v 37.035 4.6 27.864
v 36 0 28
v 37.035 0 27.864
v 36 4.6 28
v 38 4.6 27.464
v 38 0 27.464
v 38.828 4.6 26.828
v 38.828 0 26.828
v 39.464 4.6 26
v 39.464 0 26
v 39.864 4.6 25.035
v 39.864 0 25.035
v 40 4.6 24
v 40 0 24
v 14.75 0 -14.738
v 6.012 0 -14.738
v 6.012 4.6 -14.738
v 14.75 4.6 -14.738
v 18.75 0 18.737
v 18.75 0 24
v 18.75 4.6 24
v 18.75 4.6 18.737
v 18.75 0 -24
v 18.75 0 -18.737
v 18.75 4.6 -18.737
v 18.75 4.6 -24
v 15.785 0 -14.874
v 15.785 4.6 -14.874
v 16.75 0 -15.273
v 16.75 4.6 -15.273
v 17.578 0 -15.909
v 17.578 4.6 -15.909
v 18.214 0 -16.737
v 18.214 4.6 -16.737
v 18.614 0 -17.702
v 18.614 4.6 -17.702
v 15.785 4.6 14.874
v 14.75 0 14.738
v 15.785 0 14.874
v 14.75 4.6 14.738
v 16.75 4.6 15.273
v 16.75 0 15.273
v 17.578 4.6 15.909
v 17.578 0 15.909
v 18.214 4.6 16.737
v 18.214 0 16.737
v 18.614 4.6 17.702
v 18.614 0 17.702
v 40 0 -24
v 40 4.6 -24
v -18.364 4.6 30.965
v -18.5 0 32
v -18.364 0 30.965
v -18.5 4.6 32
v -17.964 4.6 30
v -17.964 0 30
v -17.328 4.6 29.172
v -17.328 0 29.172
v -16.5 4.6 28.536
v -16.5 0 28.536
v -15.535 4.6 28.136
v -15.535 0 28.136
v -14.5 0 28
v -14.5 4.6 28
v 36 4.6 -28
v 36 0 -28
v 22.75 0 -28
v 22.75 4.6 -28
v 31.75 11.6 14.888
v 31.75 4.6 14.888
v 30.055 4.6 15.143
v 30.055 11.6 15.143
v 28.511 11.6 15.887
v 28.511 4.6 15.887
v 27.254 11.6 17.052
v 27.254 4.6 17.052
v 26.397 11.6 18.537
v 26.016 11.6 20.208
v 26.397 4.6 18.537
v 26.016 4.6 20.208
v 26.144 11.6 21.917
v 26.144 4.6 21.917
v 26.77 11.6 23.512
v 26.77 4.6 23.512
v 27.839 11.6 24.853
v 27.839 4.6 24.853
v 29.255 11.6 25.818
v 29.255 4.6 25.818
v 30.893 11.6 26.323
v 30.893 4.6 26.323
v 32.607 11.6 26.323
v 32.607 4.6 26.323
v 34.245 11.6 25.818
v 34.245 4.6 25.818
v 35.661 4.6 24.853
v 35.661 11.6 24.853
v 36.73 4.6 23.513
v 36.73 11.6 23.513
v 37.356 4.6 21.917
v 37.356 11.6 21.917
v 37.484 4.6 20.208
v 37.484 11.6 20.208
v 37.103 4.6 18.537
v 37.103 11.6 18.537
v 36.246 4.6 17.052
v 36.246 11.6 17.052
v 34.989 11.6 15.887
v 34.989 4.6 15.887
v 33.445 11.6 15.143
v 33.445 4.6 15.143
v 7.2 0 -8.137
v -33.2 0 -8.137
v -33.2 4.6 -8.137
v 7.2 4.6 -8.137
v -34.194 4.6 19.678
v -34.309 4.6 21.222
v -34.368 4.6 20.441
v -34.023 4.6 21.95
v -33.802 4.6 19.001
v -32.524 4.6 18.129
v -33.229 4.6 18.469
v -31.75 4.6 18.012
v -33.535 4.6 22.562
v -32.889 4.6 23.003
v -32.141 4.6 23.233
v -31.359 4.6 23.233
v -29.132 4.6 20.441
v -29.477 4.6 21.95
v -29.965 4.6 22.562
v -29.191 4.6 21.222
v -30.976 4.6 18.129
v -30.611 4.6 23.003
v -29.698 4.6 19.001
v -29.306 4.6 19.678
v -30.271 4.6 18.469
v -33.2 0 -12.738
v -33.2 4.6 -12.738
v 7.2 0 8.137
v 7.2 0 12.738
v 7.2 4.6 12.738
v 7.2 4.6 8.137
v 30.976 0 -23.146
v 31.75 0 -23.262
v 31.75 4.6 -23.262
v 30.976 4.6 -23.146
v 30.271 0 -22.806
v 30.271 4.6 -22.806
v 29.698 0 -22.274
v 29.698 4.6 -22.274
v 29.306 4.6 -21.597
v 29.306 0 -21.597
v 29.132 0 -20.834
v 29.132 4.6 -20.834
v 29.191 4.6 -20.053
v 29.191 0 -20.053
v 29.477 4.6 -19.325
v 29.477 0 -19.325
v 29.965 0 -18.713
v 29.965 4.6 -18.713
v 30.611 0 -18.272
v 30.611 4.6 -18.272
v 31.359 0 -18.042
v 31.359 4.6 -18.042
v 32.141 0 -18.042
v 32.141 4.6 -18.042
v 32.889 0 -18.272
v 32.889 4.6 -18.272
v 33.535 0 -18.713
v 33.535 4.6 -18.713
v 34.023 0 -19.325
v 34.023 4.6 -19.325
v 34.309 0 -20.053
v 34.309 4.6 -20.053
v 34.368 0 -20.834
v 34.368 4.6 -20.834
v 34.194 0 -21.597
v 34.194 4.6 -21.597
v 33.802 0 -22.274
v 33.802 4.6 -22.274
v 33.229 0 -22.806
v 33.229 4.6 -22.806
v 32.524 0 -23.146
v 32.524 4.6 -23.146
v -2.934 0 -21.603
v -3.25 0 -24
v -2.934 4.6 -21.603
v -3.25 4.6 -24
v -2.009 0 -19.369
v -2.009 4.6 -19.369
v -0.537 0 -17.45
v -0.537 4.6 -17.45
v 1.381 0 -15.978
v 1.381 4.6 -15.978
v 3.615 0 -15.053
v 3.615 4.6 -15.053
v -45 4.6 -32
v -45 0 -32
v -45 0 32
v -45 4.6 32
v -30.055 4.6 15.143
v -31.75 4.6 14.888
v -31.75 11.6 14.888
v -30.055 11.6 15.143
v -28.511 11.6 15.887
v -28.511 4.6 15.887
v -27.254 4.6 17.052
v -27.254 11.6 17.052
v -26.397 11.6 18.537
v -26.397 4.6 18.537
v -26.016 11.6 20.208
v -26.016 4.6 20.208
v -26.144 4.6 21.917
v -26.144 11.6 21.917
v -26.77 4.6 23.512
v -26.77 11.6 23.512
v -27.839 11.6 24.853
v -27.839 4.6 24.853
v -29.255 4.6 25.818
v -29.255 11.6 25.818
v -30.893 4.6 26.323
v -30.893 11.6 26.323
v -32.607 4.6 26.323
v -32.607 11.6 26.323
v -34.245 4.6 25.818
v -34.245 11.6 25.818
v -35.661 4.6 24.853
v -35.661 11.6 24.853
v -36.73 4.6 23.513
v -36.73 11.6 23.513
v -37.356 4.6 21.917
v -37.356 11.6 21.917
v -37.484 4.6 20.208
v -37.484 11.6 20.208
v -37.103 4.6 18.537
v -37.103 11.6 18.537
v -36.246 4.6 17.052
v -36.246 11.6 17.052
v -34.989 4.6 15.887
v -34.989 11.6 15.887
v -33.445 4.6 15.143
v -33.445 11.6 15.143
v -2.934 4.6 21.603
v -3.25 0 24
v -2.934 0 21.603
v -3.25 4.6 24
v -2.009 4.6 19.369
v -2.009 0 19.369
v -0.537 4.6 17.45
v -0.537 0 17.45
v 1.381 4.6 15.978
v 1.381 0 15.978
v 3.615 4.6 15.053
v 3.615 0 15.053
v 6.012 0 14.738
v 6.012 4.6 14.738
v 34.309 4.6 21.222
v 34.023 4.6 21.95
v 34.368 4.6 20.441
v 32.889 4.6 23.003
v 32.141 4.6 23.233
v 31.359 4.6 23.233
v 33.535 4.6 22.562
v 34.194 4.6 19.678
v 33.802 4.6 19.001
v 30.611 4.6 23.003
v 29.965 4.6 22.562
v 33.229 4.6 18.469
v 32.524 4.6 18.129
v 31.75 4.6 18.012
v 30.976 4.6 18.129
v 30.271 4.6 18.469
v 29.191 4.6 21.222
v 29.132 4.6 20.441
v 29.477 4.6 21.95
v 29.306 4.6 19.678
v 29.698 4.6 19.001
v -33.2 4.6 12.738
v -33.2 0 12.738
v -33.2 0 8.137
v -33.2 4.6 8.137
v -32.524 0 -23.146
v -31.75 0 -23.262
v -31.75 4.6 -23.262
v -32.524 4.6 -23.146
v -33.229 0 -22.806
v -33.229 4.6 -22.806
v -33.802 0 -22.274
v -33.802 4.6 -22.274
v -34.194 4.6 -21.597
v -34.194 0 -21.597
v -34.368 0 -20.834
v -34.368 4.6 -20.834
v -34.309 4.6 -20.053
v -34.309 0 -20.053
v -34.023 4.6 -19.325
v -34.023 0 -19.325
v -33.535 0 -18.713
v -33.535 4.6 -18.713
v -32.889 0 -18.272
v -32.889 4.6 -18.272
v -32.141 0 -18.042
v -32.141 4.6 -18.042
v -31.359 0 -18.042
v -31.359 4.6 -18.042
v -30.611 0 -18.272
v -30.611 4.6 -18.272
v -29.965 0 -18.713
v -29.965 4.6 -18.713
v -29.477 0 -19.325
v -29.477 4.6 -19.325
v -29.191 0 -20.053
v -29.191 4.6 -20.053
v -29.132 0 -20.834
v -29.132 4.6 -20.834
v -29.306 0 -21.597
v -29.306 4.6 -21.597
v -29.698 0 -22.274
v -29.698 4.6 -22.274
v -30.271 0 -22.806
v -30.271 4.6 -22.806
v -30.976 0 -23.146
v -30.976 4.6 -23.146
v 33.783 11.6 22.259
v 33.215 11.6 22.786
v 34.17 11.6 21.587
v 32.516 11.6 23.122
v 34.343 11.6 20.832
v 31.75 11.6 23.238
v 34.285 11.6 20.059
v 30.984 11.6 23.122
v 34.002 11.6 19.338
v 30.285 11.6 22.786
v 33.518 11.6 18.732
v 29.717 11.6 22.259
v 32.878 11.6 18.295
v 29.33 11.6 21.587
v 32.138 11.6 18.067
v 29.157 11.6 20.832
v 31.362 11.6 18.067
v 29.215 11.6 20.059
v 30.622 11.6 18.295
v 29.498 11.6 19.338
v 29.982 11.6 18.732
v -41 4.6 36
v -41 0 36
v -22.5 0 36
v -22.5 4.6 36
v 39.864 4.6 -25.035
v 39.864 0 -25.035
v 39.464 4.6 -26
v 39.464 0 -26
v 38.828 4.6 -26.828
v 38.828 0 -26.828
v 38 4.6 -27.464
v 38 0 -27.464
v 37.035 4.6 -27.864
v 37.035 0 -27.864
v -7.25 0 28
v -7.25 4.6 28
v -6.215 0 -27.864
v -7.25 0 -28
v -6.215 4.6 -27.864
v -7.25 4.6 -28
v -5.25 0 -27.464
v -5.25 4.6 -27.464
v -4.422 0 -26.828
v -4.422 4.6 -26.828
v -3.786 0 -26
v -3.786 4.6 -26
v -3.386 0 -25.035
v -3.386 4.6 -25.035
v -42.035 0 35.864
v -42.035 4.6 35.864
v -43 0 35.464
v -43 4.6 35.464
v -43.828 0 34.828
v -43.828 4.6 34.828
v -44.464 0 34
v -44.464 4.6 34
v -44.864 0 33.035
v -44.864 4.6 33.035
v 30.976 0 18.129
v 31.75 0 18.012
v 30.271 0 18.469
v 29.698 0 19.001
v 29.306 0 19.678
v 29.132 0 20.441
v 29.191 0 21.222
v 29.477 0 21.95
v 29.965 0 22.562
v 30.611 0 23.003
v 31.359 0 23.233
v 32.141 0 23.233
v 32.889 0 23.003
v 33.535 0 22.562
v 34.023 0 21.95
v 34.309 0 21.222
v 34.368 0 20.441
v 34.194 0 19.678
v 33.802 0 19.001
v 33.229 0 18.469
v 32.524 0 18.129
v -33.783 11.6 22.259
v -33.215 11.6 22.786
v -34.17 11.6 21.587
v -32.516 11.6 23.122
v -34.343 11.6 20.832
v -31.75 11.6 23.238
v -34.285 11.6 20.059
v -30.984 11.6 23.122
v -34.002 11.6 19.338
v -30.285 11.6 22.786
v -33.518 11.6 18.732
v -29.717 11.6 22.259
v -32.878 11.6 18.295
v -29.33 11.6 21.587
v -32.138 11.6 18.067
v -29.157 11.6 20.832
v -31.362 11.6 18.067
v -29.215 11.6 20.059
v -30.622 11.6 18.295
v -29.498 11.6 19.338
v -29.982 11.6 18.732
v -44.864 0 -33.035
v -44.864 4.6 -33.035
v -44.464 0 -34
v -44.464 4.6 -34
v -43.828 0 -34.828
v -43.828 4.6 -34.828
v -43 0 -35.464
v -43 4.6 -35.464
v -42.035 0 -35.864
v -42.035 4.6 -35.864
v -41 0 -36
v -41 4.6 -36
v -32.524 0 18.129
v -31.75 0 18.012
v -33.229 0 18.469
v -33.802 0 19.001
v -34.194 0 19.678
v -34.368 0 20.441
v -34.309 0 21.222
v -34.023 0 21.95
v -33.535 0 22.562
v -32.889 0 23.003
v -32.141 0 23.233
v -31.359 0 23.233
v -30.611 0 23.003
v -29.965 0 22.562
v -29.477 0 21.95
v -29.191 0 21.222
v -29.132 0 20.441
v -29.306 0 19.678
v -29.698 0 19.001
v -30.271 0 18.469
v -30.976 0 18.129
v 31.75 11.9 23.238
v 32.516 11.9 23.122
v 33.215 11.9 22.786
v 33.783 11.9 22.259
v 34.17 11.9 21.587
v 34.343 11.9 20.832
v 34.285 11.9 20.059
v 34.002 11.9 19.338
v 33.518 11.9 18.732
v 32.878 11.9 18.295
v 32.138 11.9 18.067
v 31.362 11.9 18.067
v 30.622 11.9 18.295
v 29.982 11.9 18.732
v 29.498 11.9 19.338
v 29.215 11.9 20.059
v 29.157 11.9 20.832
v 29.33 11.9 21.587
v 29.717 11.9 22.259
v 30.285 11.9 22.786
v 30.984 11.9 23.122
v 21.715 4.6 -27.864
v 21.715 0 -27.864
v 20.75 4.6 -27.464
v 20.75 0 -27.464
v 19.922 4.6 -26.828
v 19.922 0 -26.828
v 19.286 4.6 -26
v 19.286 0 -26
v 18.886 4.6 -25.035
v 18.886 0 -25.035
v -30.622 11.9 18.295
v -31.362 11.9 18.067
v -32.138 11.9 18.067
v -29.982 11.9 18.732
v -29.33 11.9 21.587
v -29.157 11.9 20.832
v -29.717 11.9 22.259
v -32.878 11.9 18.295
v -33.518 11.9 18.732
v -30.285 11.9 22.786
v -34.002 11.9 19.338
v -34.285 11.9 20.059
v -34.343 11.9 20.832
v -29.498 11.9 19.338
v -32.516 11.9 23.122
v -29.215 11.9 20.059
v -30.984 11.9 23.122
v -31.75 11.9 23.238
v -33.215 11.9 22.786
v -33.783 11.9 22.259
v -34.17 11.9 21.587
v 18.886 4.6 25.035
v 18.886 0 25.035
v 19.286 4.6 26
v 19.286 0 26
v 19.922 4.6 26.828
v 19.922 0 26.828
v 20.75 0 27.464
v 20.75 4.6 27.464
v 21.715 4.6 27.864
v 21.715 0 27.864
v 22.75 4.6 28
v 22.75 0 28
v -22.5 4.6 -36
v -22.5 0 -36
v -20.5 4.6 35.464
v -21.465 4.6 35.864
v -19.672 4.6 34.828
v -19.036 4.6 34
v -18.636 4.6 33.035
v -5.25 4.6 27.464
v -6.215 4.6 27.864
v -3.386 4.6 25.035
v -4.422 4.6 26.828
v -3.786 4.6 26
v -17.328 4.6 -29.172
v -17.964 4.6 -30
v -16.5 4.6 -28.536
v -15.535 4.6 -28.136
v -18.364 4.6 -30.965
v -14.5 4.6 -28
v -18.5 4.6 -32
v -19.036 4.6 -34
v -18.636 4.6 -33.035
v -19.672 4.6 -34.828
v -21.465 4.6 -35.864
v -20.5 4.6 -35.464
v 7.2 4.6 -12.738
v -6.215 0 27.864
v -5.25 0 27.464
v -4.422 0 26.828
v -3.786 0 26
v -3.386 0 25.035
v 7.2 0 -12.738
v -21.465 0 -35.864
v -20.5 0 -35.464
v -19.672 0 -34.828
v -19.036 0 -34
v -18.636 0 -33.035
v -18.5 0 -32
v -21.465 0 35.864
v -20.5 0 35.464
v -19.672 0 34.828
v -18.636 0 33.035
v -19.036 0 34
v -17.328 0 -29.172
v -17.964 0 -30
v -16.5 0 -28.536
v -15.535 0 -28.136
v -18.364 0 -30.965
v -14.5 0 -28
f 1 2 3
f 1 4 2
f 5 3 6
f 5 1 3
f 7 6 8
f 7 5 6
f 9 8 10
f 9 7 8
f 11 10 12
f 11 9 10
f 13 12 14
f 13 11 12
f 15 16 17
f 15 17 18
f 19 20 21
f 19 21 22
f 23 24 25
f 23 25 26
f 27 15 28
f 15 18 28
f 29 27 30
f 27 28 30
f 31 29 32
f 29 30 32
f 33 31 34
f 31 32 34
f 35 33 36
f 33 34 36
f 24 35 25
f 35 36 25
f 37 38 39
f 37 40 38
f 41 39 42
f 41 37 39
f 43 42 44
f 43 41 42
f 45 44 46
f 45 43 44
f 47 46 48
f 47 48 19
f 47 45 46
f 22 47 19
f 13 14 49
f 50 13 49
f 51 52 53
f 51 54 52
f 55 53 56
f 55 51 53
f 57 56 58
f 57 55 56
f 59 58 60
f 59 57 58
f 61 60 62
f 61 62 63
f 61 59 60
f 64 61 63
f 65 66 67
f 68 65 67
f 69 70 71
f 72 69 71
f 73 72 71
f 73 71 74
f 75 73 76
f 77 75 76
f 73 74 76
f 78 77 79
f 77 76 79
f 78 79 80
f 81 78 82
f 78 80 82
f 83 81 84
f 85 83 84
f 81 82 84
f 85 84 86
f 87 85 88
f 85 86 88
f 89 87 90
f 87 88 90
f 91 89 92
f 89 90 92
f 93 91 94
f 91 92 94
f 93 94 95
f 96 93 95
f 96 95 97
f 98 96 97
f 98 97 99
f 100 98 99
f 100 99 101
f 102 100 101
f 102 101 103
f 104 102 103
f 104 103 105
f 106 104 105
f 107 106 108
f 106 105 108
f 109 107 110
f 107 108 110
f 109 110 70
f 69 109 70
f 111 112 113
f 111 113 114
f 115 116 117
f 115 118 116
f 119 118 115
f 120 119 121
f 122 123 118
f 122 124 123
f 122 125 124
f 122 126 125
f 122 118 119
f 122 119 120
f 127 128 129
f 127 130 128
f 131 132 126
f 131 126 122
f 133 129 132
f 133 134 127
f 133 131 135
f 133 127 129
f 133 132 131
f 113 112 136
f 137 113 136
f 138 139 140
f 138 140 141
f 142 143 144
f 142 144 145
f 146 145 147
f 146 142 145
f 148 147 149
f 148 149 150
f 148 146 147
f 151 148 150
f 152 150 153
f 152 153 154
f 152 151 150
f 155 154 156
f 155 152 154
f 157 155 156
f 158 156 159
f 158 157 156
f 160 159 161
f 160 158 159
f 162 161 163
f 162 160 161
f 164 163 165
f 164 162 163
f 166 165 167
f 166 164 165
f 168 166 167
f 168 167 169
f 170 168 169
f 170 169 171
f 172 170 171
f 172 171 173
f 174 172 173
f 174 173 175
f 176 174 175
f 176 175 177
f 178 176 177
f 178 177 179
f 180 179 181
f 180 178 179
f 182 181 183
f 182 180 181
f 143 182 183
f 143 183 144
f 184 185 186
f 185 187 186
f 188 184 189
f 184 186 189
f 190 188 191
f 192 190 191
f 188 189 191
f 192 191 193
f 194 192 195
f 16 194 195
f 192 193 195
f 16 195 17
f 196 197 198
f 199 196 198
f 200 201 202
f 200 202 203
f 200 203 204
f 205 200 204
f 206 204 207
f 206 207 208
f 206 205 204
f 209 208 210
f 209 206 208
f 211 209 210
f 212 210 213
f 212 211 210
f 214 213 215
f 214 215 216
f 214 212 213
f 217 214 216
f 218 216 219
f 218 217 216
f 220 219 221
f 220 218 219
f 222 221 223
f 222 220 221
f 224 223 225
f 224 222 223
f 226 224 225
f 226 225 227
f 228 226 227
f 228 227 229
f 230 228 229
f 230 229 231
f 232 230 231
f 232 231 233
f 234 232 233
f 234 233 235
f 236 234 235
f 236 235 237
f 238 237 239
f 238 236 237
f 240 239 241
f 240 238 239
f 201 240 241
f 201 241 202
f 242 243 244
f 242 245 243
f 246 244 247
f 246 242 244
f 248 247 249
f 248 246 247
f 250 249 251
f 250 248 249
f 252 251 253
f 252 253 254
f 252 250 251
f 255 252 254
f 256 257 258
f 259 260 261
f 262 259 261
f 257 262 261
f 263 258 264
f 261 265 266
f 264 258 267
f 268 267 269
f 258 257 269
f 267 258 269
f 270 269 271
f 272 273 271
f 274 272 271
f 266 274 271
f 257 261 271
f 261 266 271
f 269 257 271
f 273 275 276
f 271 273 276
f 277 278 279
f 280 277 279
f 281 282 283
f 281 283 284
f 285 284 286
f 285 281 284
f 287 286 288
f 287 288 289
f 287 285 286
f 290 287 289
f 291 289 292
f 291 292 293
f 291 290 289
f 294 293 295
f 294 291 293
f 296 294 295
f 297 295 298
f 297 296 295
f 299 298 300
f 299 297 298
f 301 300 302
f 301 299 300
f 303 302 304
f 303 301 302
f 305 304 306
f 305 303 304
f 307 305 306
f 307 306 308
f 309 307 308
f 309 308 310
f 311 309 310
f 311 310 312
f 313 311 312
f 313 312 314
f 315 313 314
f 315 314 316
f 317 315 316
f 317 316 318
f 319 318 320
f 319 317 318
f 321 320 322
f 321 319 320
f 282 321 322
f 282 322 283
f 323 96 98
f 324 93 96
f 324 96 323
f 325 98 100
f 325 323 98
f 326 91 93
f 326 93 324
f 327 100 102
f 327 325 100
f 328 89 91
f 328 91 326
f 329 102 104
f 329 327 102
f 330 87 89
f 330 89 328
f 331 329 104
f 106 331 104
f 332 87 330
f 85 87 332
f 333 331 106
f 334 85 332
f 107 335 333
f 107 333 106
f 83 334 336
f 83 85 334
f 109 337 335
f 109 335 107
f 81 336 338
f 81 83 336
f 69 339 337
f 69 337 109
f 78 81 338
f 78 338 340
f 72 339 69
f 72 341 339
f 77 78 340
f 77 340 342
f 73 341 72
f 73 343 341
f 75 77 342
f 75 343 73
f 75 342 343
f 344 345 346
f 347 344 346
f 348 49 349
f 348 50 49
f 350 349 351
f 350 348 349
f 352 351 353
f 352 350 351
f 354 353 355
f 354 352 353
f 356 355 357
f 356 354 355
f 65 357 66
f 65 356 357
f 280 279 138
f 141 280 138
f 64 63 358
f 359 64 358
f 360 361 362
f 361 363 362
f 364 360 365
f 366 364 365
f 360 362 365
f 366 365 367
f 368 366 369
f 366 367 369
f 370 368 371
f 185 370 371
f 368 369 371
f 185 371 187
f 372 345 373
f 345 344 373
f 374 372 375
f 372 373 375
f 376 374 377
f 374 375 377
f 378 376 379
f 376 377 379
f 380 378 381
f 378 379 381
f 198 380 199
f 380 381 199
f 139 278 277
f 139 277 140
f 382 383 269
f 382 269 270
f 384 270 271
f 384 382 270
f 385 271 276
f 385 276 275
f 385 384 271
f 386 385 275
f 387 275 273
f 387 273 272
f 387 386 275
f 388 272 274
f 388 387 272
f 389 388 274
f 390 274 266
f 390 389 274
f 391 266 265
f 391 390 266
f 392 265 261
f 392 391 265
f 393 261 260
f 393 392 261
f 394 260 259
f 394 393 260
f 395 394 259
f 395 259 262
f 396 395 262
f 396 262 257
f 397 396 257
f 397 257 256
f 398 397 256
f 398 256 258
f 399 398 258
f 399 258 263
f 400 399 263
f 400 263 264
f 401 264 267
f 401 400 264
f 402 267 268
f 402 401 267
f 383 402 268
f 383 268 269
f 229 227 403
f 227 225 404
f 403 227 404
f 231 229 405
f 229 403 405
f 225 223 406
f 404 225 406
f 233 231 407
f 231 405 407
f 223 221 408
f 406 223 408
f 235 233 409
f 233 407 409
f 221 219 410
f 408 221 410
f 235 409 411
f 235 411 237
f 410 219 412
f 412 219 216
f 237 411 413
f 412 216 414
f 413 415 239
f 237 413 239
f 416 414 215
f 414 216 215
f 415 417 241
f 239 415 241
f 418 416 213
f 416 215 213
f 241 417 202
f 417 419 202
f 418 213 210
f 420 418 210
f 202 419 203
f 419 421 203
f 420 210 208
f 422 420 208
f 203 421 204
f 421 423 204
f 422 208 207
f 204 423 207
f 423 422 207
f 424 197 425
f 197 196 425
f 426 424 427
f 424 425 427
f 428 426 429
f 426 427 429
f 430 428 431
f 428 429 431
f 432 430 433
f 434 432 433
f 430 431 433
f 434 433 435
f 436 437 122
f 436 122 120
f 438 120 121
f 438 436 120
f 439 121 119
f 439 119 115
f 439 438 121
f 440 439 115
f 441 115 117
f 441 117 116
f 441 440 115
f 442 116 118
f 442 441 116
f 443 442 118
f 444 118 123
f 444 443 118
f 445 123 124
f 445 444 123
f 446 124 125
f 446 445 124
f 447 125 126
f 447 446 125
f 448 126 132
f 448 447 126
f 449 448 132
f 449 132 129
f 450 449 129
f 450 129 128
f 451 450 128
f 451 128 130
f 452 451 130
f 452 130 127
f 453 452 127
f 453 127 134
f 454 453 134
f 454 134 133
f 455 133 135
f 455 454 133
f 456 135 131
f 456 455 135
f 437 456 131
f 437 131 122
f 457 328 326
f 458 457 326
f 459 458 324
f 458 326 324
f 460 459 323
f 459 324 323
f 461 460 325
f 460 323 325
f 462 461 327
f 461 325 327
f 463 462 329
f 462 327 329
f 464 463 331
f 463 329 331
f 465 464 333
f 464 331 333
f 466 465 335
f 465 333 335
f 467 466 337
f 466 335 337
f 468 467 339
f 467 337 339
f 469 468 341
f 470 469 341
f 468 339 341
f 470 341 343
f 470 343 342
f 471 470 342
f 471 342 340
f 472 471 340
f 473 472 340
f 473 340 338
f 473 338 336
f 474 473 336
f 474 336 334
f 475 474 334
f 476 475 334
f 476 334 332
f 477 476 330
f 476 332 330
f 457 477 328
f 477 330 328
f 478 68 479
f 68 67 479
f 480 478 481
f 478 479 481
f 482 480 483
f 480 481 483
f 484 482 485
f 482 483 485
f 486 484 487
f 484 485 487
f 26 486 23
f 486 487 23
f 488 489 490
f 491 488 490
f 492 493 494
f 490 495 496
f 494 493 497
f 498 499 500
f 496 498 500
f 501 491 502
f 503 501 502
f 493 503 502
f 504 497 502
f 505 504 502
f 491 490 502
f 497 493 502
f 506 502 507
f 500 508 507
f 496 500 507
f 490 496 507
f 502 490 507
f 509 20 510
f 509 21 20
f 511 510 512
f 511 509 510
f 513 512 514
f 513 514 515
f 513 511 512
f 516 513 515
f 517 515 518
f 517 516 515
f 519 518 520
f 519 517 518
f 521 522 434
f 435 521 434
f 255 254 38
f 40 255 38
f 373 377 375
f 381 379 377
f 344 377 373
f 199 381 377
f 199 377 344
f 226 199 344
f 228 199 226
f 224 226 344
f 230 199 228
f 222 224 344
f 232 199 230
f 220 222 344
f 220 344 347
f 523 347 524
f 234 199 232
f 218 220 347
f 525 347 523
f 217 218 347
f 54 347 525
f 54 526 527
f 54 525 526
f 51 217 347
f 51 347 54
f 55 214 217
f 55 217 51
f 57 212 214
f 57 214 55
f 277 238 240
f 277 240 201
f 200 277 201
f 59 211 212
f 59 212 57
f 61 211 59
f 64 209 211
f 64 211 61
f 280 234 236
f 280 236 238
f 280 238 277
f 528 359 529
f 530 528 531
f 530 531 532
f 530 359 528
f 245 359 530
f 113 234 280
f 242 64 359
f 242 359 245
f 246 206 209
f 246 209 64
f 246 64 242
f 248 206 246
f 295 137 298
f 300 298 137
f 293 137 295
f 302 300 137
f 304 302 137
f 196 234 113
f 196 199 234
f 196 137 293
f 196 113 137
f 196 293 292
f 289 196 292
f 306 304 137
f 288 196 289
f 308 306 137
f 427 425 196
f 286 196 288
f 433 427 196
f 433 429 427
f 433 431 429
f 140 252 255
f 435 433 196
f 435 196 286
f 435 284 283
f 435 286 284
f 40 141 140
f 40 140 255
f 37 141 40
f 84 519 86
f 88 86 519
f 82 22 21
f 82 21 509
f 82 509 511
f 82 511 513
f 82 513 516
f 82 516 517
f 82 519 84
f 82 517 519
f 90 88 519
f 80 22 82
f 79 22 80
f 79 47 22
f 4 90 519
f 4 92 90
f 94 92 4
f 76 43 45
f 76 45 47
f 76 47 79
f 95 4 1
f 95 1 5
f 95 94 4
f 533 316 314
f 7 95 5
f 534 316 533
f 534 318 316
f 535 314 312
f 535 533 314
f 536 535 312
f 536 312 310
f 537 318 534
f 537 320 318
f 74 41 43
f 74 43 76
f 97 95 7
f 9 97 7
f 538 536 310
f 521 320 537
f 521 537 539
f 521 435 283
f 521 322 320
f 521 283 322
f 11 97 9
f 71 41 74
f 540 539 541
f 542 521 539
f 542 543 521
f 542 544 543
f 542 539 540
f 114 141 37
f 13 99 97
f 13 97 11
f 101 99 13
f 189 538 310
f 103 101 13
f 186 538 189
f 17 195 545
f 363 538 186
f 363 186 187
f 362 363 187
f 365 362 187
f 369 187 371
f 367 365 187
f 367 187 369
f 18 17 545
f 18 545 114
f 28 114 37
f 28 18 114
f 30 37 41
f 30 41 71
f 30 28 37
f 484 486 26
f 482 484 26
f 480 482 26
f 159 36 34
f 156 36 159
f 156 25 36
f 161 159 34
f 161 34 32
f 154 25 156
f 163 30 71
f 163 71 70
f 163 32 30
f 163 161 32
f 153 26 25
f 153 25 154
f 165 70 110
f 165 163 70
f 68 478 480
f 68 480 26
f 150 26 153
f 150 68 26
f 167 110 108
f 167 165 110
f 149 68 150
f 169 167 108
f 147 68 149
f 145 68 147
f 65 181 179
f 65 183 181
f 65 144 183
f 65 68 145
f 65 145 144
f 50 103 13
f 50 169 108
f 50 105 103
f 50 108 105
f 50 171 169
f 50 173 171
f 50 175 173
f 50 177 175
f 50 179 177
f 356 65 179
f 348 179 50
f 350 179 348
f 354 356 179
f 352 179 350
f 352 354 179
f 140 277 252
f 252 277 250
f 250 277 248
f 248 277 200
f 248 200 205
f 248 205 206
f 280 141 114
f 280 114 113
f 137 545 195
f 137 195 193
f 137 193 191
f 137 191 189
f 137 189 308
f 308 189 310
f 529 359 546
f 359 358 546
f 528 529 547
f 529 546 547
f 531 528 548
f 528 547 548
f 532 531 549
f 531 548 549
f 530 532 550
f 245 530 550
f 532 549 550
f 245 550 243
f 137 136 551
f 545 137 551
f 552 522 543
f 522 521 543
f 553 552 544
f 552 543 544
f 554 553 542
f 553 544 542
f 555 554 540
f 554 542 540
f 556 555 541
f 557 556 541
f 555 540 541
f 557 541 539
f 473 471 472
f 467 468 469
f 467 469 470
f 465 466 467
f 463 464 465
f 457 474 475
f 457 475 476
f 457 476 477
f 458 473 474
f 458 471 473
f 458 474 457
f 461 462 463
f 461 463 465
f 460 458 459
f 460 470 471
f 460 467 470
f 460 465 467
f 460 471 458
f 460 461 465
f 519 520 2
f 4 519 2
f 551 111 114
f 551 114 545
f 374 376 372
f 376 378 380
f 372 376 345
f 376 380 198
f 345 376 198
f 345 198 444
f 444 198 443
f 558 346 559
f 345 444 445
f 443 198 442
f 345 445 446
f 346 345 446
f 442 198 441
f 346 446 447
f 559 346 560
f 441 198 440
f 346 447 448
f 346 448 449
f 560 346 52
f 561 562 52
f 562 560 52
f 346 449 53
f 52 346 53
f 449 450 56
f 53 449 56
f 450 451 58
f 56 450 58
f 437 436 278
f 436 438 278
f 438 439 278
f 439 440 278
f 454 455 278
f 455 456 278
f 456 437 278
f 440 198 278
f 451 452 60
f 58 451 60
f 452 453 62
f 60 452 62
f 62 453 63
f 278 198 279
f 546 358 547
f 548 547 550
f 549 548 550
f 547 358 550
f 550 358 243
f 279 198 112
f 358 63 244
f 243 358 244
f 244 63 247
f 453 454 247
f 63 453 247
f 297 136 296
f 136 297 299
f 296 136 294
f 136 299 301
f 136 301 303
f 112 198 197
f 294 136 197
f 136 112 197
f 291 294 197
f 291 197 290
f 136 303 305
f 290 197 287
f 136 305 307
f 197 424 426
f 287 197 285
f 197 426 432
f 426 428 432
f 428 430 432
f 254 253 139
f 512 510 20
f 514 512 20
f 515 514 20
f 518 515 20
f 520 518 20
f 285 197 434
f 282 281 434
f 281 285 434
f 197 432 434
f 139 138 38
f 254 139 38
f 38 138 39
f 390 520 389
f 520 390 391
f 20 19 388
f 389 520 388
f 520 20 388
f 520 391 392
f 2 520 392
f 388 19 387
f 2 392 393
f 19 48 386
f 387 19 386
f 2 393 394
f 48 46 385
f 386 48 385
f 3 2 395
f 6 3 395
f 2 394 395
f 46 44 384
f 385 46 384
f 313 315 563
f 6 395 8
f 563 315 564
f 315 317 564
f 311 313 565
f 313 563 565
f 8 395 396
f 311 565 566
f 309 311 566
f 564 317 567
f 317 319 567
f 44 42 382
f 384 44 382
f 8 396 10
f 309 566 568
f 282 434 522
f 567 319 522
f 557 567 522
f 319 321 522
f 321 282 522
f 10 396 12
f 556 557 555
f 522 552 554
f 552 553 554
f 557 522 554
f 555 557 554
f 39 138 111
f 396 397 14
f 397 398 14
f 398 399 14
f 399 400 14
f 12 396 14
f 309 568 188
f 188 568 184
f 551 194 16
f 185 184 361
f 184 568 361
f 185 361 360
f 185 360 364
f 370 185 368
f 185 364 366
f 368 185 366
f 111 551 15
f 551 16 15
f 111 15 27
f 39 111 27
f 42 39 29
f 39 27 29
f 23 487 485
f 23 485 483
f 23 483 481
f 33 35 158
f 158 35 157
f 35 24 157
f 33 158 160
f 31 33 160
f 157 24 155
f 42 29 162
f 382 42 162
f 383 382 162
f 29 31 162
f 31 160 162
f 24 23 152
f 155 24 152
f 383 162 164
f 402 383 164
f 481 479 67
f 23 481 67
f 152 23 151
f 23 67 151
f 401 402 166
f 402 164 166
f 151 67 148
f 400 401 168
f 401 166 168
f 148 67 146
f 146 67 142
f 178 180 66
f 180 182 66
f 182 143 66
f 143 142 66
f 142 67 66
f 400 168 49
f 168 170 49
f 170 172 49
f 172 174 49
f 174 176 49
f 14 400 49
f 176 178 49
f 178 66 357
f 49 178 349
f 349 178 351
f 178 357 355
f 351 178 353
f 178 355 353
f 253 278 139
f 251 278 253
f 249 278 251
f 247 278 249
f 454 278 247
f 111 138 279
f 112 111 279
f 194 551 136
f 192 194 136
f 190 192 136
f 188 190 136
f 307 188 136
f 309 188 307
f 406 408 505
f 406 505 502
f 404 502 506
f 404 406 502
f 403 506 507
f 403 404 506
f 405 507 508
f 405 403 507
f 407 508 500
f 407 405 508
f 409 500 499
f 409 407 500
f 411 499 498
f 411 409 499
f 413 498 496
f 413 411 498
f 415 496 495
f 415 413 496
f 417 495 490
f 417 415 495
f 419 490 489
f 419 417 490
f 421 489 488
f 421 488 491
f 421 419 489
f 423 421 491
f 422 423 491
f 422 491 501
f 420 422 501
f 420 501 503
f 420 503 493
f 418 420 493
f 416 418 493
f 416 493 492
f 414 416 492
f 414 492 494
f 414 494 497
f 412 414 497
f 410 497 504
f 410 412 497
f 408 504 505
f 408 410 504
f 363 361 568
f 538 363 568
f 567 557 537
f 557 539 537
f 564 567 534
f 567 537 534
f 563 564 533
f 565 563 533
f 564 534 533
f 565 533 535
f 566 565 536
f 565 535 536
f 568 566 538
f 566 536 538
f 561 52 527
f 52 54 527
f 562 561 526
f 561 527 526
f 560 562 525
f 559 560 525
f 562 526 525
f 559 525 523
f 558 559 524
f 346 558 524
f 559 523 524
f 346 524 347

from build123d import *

# Parameters (mm, degrees)
EXTRUDE_1_DEPTH     = 4.6
SKETCH_1_R          = 2.625
SKETCH_1_W          = 40.4
SKETCH_1_H          = 4.6
CUT_EXTRUDE_1_DEPTH = 4.6
SKETCH_5_R          = 5.75
EXTRUDE_2_DEPTH     = 7
SKETCH_6_R          = 2.6
EXTRUDE_3_DEPTH     = 0.3
FILLET_2_R          = 4
FILLET_3_R          = 9.2625


with BuildPart() as part:
    # 草图3 → 凸台-拉伸1 (new body)
    with BuildSketch(Plane(origin=(0, 0, 0), x_dir=(1, 0, 0), z_dir=(0, 1, 0))):
        Polygon((-18.5, -28), (40, -28), (40, 28), (-18.5, 28), (-18.5, 36), (-45, 36), (-45, 28), (-45, -28), (-45, -36), (-18.5, -36), align=None)
    extrude(amount=EXTRUDE_1_DEPTH)

    # 草图1 → 切除-拉伸1 (cut)
    with BuildSketch(Plane(origin=(0, 0, 0), x_dir=(1, 0, 0), z_dir=(0, 1, 0))):
        with Locations(Location((-31.75, 20.6375, 0), (0, 0, 90))):
            Circle(SKETCH_1_R)
        with Locations(Location((31.75, 20.6375, 0), (0, 0, 90))):
            Circle(SKETCH_1_R)
        with Locations(Location((31.75, -20.6375, 0), (0, 0, 90))):
            Circle(SKETCH_1_R)
        with Locations(Location((-31.75, -20.6375, 0), (0, 0, 90))):
            Circle(SKETCH_1_R)
        with Locations((-13, -10.4375)):
            Rectangle(SKETCH_1_W, SKETCH_1_H)
        with Locations((-13, 10.4375)):
            Rectangle(SKETCH_1_W, SKETCH_1_H)
        Polygon((-3.25, -26.5375), (-3.25, -14.7375), (18.75, -14.7375), (18.75, -26.5375), (18.75, -29.869530405), (-3.25, -29.869530405), align=None)
        Polygon((-3.25, 14.7375), (18.75, 14.7375), (18.75, 26.5375), (18.75, 29.869530405), (-3.25, 29.869530405), (-3.25, 26.5375), align=None)
    extrude(amount=CUT_EXTRUDE_1_DEPTH, mode=Mode.SUBTRACT)

    # 草图5 → 凸台-拉伸2 (add)
    with BuildSketch(Plane(origin=(0, 4.6, 0), x_dir=(1, 0, 0), z_dir=(0, 1, 0))):
        with Locations(Location((31.75, -20.6375, 0), (0, 0, 90))):
            Circle(SKETCH_5_R)
    extrude_2 = extrude(amount=EXTRUDE_2_DEPTH)

    # 草图6 → 凸台-拉伸3 (add)
    with BuildSketch(Plane(origin=(0, 11.6, 0), x_dir=(1, 0, 0), z_dir=(0, 1, 0))):
        with Locations(Location((31.75, -20.6375, 0), (0, 0, 270))):
            Circle(SKETCH_6_R)
    extrude_3 = extrude(amount=EXTRUDE_3_DEPTH)

    # 圆角2
    fillet_2_edges = [part.edges().sort_by_distance(p)[0] for p in [
        (-3.25, 2.3, -28),
        (18.75, 2.3, -28),
        (40, 2.3, -28),
        (40, 2.3, 28),
        (18.75, 2.3, 28),
        (-3.25, 2.3, 28),
        (18.75, 2.3, -14.7375),
        (18.75, 2.3, 14.7375),
        (-18.5, 2.3, 28),
        (-18.5, 2.3, 36),
        (-45, 2.3, 36),
        (-45, 2.3, -36),
        (-18.5, 2.3, -36),
        (-18.5, 2.3, -28),
    ]]
    fillet(fillet_2_edges, radius=FILLET_2_R - 0.0001)  # a hair under: the kernel refuses the full size

    # 镜向1: 凸台-拉伸2, 凸台-拉伸3 across plane
    add(extrude_2.mirror(Plane(origin=(0, 0, 0), x_dir=(0, 0, 1), z_dir=(1, 0, 0))))
    add(extrude_3.mirror(Plane(origin=(0, 0, 0), x_dir=(0, 0, 1), z_dir=(1, 0, 0))))

    # 圆角3
    fillet_3_edges = [part.edges().sort_by_distance(p)[0] for p in [
        (-3.25, 2.3, -14.7375),
        (-3.25, 2.3, 14.7375),
    ]]
    fillet(fillet_3_edges, radius=FILLET_3_R)


solid = part.part
